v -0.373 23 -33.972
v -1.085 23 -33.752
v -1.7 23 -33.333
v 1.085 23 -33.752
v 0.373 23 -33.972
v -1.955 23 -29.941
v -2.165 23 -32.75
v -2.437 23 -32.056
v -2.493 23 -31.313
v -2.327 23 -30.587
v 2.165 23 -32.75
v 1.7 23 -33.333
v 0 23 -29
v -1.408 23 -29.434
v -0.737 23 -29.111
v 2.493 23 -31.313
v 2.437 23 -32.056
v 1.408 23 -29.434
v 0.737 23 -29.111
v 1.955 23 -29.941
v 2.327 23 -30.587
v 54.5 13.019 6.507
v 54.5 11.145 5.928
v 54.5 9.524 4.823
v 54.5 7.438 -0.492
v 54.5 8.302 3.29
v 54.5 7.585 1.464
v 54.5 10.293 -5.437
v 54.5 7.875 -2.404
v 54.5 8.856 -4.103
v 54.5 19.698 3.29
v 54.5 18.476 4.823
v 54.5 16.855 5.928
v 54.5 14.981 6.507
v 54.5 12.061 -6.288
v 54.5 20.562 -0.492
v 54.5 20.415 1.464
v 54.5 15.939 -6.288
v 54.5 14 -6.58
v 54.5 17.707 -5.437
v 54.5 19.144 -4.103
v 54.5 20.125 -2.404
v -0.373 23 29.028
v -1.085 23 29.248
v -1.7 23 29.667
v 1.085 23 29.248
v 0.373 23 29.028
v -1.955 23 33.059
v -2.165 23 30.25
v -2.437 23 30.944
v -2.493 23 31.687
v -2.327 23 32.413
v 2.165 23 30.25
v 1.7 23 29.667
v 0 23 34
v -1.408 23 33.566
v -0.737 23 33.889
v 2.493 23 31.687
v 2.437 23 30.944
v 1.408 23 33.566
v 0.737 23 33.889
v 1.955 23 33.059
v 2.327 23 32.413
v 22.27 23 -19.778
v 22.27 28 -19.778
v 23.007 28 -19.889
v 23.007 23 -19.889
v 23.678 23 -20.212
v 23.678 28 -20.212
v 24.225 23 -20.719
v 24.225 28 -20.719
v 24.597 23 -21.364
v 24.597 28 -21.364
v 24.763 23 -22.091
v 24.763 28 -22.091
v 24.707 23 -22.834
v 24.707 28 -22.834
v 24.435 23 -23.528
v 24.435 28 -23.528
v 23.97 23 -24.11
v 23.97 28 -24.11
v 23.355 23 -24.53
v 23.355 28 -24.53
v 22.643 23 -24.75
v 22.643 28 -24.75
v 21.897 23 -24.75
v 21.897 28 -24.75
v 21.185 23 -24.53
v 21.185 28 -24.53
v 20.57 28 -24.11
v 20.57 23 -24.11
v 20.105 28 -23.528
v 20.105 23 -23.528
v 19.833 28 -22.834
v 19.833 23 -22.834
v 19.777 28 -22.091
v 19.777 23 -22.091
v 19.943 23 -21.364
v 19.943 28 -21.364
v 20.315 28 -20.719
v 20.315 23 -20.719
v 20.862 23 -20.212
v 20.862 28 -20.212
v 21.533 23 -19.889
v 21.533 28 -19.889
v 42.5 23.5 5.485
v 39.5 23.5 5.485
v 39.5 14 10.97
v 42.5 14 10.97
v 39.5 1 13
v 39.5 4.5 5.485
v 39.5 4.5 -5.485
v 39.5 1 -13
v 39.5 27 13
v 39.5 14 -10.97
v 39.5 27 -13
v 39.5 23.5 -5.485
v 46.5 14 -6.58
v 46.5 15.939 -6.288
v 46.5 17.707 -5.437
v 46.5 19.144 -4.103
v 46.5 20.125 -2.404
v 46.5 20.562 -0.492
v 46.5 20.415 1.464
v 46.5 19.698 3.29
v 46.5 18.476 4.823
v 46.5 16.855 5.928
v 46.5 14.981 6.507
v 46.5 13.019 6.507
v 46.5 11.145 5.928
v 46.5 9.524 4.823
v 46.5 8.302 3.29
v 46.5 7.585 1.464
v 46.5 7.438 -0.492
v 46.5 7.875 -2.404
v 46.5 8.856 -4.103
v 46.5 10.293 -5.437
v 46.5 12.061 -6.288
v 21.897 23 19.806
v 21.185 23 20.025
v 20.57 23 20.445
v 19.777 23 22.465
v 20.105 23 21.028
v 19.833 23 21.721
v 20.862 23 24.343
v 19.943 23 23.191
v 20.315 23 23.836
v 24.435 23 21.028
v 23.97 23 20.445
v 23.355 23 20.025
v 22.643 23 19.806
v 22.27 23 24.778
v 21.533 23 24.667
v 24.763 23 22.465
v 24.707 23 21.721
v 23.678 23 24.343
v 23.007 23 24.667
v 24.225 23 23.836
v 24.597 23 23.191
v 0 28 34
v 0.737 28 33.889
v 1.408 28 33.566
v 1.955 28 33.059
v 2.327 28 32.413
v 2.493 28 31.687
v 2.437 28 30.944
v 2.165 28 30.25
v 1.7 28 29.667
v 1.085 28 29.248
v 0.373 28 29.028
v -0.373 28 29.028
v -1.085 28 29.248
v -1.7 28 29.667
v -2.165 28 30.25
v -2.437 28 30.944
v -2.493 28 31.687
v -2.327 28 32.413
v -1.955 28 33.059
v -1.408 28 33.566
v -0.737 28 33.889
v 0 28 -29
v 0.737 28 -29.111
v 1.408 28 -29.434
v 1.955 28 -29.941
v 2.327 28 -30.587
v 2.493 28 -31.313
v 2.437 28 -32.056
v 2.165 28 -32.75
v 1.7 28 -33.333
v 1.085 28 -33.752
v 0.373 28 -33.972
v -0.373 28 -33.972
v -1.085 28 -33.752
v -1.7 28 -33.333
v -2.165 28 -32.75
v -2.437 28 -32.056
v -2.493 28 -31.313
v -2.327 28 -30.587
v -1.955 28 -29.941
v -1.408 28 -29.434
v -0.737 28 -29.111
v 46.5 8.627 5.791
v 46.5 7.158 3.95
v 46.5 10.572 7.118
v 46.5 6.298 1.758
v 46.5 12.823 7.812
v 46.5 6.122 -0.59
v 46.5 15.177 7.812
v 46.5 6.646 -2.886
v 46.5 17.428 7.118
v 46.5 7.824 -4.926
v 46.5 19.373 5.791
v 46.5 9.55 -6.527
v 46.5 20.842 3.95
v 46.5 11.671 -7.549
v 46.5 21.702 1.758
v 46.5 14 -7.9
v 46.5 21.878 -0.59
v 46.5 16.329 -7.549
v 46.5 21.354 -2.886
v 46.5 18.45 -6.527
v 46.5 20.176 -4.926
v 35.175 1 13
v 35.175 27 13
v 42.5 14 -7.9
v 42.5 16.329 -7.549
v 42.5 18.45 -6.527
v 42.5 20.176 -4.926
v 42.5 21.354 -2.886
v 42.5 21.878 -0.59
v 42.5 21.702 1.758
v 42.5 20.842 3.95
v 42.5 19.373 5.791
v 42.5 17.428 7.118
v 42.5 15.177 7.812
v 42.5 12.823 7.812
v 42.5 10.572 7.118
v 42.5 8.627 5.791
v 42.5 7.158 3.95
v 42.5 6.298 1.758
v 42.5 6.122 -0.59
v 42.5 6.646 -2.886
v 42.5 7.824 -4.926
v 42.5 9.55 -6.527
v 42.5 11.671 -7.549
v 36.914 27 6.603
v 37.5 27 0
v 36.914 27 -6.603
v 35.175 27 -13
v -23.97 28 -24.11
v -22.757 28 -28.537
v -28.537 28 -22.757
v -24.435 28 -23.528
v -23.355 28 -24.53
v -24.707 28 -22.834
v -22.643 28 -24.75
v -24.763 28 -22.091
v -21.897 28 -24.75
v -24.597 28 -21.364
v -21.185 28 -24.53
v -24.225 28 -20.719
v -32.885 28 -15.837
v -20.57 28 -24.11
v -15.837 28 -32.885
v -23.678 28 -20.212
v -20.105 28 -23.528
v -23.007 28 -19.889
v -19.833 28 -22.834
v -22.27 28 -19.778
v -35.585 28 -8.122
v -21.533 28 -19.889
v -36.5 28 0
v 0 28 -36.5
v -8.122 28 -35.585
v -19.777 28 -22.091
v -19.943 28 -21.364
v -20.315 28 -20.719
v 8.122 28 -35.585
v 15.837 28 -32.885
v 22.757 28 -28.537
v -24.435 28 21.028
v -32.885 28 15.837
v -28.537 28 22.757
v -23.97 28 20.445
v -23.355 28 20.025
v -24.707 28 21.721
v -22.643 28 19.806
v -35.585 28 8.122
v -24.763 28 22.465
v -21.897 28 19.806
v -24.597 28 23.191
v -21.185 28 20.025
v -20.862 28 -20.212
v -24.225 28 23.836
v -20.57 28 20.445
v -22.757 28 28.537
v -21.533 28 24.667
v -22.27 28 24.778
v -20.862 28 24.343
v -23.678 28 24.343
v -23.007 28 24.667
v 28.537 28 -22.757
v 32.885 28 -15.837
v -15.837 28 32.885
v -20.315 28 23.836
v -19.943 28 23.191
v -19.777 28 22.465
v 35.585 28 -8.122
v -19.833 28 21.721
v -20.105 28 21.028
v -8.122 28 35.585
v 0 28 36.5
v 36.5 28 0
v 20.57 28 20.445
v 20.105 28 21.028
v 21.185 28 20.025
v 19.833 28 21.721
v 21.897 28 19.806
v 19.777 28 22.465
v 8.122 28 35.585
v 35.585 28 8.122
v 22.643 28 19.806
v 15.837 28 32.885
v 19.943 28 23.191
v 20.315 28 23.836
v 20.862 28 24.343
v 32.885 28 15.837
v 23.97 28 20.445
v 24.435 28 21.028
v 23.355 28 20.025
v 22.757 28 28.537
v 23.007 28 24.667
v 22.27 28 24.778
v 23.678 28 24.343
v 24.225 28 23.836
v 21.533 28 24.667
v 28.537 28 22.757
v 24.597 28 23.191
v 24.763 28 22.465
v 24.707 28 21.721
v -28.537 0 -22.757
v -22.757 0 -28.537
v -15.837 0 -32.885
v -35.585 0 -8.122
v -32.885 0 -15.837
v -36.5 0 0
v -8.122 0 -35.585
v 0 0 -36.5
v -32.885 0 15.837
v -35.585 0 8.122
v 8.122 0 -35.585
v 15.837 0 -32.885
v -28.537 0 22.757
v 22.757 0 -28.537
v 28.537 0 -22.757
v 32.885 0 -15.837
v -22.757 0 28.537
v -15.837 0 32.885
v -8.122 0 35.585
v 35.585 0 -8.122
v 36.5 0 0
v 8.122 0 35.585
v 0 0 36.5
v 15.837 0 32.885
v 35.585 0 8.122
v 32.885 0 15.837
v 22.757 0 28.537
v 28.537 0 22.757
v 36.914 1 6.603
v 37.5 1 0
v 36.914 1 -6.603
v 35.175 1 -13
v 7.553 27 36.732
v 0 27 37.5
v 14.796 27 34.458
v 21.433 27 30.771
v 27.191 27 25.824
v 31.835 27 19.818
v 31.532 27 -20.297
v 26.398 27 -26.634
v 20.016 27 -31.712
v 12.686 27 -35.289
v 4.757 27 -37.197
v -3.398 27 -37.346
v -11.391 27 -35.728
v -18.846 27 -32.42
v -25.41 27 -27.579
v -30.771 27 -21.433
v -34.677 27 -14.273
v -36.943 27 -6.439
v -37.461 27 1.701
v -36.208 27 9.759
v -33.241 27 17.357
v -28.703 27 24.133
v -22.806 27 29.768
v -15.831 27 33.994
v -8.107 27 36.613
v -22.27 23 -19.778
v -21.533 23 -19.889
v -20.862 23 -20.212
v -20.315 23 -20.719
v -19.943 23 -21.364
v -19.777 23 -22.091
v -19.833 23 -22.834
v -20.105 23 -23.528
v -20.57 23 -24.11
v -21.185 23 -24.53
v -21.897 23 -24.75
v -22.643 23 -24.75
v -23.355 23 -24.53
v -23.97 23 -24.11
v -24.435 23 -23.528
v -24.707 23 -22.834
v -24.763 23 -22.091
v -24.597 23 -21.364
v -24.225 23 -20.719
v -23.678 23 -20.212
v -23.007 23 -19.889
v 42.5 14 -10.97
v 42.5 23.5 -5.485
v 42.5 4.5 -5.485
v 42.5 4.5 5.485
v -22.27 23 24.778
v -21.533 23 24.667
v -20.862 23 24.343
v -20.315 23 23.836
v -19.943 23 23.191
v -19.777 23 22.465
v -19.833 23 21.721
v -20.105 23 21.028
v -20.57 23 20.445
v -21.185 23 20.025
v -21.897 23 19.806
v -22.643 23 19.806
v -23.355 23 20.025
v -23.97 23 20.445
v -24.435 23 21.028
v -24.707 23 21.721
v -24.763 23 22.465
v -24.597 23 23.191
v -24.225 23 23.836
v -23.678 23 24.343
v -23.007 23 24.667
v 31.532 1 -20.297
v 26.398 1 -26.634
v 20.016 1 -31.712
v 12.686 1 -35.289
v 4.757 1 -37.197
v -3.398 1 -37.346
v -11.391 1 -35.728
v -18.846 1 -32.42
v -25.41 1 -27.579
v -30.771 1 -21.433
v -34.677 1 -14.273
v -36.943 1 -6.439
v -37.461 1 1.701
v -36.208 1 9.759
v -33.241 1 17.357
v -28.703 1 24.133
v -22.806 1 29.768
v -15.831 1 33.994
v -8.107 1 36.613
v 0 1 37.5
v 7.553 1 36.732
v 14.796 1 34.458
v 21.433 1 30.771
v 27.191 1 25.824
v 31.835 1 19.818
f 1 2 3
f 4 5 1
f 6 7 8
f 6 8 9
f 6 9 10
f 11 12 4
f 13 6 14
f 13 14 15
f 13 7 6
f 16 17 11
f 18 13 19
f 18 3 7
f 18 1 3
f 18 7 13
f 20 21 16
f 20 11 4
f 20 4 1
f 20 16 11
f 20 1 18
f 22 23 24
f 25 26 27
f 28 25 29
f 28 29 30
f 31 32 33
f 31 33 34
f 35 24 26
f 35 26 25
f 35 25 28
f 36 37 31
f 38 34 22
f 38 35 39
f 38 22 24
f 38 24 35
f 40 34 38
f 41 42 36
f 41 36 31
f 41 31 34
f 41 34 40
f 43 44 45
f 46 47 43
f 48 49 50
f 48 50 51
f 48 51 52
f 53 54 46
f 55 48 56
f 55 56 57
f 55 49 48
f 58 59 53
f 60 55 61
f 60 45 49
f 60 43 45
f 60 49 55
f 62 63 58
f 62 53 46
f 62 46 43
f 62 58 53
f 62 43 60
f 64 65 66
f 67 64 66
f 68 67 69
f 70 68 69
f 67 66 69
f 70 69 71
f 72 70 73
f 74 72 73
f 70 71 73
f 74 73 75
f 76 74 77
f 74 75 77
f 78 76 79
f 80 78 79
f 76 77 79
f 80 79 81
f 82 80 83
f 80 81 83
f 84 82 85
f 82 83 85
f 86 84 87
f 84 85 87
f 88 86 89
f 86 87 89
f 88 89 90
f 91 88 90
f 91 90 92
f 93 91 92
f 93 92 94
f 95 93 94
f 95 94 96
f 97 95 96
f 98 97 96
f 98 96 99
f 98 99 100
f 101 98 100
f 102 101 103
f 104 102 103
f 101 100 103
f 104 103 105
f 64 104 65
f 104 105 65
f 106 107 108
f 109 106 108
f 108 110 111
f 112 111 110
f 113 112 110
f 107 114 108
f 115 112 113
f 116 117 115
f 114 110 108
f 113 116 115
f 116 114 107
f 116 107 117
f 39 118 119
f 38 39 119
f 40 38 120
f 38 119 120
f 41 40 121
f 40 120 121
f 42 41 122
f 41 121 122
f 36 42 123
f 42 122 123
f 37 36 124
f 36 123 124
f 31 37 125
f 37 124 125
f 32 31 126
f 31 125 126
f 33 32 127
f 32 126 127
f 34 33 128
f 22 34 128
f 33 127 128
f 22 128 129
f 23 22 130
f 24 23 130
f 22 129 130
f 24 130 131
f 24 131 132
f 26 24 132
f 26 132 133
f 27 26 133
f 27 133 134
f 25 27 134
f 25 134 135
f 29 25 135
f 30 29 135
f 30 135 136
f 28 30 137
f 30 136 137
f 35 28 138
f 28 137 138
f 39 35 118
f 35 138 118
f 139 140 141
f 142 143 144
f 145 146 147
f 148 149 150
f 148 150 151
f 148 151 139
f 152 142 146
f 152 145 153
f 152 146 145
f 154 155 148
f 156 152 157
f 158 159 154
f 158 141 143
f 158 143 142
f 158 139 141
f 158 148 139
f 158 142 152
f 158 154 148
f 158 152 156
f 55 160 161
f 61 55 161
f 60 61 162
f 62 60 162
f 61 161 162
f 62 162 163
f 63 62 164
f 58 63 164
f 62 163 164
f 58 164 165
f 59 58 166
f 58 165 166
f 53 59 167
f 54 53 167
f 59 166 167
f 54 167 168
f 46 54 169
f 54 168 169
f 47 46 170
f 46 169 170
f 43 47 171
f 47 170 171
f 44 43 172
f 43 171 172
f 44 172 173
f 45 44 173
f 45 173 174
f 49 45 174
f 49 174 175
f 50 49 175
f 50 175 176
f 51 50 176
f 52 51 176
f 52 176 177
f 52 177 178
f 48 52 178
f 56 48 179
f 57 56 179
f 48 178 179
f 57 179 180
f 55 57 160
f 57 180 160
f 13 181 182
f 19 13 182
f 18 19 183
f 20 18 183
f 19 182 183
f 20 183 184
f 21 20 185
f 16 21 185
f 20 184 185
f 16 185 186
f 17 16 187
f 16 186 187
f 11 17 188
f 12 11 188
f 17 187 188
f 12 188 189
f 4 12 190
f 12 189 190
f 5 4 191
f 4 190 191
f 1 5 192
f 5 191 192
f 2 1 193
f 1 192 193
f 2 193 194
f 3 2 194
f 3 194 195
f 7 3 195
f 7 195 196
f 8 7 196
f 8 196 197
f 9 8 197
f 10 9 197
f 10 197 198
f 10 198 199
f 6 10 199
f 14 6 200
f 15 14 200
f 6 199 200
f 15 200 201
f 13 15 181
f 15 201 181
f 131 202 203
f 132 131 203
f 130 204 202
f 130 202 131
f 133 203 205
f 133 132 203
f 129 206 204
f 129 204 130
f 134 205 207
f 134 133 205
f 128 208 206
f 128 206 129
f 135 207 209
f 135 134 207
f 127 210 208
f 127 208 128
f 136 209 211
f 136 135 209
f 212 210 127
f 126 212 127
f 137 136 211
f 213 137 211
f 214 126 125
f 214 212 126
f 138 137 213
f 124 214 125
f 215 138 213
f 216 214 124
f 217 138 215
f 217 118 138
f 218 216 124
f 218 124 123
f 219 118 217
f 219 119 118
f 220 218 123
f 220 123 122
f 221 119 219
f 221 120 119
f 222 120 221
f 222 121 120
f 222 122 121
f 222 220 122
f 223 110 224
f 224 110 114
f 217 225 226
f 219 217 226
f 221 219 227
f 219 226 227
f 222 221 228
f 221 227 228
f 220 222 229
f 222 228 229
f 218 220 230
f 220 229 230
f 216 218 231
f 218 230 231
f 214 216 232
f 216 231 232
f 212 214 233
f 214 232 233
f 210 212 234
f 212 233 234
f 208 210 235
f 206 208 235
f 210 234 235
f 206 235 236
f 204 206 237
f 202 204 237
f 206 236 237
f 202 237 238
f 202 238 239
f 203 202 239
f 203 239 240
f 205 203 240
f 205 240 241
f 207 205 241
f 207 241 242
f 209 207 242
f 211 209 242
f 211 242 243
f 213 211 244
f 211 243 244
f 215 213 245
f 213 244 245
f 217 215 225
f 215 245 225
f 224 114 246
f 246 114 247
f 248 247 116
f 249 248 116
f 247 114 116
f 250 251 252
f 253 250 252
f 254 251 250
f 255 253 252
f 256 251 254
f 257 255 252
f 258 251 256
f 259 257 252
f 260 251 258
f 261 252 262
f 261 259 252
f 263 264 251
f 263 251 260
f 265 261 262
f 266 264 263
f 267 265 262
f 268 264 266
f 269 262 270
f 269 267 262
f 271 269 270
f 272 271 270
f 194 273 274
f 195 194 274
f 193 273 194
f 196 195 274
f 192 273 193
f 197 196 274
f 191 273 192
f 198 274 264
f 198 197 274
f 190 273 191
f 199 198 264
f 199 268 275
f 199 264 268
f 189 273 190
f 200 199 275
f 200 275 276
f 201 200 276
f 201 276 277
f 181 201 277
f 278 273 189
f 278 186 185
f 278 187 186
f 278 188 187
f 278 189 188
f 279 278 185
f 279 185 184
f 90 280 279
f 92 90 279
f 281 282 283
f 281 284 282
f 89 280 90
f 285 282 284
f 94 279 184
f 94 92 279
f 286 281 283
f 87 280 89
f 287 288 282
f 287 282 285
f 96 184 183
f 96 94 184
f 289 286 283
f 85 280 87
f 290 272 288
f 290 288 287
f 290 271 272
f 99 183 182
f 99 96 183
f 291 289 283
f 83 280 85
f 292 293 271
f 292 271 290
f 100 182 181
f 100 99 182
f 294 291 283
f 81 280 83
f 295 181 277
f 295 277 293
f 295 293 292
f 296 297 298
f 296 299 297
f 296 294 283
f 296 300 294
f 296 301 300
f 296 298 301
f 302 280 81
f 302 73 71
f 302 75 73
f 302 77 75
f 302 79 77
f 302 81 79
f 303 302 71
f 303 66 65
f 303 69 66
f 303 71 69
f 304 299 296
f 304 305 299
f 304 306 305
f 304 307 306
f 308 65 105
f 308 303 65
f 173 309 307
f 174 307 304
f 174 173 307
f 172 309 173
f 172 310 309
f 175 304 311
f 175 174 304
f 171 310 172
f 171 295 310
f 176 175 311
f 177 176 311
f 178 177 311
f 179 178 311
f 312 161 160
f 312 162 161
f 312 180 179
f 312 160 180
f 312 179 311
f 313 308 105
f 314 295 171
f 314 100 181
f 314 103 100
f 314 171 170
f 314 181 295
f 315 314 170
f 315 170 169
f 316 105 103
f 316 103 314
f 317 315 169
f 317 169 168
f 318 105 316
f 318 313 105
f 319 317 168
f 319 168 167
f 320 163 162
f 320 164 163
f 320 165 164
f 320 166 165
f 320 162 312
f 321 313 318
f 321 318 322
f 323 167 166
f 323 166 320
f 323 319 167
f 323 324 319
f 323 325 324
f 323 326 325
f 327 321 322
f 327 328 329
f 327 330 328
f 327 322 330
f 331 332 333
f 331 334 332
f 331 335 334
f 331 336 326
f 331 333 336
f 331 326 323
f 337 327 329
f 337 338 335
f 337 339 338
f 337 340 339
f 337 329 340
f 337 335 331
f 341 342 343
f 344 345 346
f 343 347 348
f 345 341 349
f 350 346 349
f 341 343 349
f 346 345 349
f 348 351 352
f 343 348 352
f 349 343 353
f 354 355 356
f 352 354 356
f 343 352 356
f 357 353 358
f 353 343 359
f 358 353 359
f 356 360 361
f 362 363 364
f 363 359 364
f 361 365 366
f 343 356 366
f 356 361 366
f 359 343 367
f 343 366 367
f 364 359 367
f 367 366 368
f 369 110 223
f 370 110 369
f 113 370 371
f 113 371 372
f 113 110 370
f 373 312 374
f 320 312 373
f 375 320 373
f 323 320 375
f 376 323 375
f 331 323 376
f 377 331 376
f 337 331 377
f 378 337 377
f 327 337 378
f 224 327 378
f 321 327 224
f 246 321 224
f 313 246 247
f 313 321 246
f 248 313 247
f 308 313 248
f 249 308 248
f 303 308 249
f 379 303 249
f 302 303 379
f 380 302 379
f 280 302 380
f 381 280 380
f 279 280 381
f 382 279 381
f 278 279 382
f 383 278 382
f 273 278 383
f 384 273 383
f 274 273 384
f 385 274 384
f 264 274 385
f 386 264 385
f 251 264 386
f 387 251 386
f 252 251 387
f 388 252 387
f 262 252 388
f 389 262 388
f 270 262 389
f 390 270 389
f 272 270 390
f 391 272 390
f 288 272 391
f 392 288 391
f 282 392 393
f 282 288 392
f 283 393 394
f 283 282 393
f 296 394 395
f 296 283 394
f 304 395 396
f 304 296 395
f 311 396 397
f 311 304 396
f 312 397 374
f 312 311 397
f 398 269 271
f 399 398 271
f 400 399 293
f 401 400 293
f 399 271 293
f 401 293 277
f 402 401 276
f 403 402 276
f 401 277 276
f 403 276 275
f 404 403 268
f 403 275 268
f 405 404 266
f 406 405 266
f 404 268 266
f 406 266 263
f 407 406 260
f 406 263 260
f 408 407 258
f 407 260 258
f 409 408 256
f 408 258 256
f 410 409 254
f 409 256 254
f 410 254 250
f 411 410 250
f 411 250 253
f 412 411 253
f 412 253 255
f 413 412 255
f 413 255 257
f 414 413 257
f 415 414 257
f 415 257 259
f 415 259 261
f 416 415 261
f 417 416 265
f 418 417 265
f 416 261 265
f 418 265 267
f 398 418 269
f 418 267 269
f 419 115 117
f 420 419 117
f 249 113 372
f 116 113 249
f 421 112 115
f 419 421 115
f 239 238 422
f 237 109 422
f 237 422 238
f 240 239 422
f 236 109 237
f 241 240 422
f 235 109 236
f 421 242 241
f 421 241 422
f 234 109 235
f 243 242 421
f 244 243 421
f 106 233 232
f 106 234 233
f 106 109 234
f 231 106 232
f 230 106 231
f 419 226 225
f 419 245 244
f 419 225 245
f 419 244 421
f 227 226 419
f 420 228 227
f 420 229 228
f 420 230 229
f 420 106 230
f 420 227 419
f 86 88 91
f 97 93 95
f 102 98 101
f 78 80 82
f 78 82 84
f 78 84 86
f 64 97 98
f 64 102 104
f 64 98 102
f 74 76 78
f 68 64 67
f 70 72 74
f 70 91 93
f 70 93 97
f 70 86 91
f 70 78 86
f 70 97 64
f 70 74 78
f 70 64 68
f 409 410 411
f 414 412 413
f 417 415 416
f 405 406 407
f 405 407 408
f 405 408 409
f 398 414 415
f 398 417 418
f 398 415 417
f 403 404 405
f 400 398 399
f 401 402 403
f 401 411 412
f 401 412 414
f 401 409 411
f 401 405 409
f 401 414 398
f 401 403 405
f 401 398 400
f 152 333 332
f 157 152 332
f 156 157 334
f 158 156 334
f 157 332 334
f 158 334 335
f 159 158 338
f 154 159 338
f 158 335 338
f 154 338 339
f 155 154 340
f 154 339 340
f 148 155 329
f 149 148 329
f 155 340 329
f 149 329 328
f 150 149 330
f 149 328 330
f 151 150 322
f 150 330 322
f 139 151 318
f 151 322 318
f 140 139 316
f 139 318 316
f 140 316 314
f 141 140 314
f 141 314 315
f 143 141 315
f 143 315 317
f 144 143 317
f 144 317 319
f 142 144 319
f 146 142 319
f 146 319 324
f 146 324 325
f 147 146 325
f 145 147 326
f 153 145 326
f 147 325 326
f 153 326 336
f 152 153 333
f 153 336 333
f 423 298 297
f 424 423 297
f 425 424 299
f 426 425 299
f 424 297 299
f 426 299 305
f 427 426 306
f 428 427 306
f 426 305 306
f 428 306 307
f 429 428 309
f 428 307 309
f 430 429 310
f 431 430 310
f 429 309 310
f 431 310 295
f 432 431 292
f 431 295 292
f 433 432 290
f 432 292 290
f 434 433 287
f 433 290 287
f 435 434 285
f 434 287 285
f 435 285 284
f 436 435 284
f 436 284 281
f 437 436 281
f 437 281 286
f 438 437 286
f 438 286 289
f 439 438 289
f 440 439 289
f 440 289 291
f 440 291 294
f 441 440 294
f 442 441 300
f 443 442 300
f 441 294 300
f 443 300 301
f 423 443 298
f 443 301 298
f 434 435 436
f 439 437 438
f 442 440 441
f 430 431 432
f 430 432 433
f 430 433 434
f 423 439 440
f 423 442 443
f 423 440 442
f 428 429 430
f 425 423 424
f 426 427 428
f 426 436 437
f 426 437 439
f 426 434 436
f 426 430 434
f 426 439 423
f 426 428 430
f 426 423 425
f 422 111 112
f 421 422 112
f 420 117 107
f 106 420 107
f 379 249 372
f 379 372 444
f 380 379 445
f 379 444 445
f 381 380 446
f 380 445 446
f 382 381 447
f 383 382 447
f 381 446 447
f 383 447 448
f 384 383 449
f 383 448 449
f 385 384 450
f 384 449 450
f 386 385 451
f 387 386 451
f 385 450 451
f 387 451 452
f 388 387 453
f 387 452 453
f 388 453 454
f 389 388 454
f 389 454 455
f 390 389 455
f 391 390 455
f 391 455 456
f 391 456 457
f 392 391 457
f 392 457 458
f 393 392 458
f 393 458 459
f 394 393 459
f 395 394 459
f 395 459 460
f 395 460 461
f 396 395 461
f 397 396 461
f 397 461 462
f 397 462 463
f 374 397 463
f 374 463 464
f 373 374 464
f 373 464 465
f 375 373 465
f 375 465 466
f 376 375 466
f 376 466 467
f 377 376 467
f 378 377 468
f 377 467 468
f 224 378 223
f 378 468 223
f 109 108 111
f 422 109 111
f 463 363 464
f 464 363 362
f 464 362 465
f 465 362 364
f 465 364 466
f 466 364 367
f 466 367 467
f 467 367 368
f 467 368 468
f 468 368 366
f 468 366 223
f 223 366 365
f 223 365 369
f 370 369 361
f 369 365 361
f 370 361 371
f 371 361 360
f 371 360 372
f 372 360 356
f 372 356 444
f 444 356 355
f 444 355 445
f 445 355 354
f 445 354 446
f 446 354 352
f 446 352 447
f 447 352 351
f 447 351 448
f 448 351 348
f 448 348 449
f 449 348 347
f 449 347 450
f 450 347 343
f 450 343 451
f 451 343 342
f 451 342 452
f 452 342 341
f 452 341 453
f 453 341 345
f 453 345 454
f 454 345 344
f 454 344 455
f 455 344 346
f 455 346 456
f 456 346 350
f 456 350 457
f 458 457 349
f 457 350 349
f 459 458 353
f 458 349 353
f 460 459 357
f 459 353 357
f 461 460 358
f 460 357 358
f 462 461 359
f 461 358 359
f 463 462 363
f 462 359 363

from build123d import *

# Parameters (mm, degrees)
SKETCH1_R           = 37.5
BOSS_EXTRUDE1_DEPTH = 28
CHAMFER1_SIZE       = 1
BOSS_EXTRUDE2_REACH = 92.107
SKETCH2_W           = 26
SKETCH2_H           = 26
BOSS_EXTRUDE3_DEPTH = 3
SKETCH4_R           = 7.9
BOSS_EXTRUDE4_DEPTH = 4
SKETCH5_R           = 6.58
BOSS_EXTRUDE5_DEPTH = 8
SKETCH6_R           = 2.5
CUT_EXTRUDE1_DEPTH  = 5


with BuildPart() as part:
    # Sketch1 → Boss-Extrude1 (new body)
    with BuildSketch(Plane(origin=(0, 0, 0), x_dir=(1, 0, 0), z_dir=(0, 1, 0))):
        with Locations(Location((0, 0, 0), (0, 0, 270))):
            Circle(SKETCH1_R)
    extrude(amount=BOSS_EXTRUDE1_DEPTH)

    # Chamfer1
    chamfer1_edges = [part.edges().sort_by_distance(p)[0] for p in [
        (0, 0, -37.5),
        (0, 28, -37.5),
    ]]
    chamfer(chamfer1_edges, length=CHAMFER1_SIZE)

    # Sketch2 → Boss-Extrude2 (add, up to next)
    with BuildSketch(Plane(origin=(39.5, 0, 0), x_dir=(0, 0, -1), z_dir=(1, 0, 0)), mode=Mode.PRIVATE) as boss_extrude2_sk1:
        with Locations((0, 14)):
            Rectangle(SKETCH2_W, SKETCH2_H)
    boss_extrude2_tool1 = extrude(boss_extrude2_sk1.sketch, amount=-BOSS_EXTRUDE2_REACH, mode=Mode.PRIVATE) - part.part
    add(boss_extrude2_tool1.solids().sort_by_distance((39.5, 14, 0))[0])

    # Sketch3 → Boss-Extrude3 (add)
    with BuildSketch(Plane(origin=(39.5, 0, 0), x_dir=(0, 0, -1), z_dir=(1, 0, 0))):
        Polygon((10.97, 14), (5.485, 23.50029868), (-5.485, 23.50029868), (-10.97, 14), (-5.485, 4.49970132), (5.485, 4.49970132), align=None)
    extrude(amount=BOSS_EXTRUDE3_DEPTH)

    # Sketch4 → Boss-Extrude4 (add)
    with BuildSketch(Plane(origin=(42.5, 0, 0), x_dir=(0, 0, -1), z_dir=(1, 0, 0))):
        with Locations((0, 14)):
            Circle(SKETCH4_R)
    extrude(amount=BOSS_EXTRUDE4_DEPTH)

    # Sketch5 → Boss-Extrude5 (add)
    with BuildSketch(Plane(origin=(46.5, 0, 0), x_dir=(0, 0, -1), z_dir=(1, 0, 0))):
        with Locations((0, 14)):
            Circle(SKETCH5_R)
    extrude(amount=BOSS_EXTRUDE5_DEPTH)

    # Sketch6 → Cut-Extrude1 (cut)
    with BuildSketch(Plane(origin=(0, 28, 0), x_dir=(1, 0, 0), z_dir=(0, 1, 0))):
        with Locations(Location((0, 31.5, 0), (0, 0, 270))):
            Circle(SKETCH6_R)
        with Locations(Location((0, -31.5, 0), (0, 0, 270))):
            Circle(SKETCH6_R)
        with Locations(Location((22.27, -22.277726545, 0), (0, 0, 270))):
            Circle(SKETCH6_R)
        with Locations(Location((-22.27, -22.277726545, 0), (0, 0, 270))):
            Circle(SKETCH6_R)
        with Locations(Location((-22.27, 22.277726545, 0), (0, 0, 270))):
            Circle(SKETCH6_R)
        with Locations(Location((22.27, 22.277726545, 0), (0, 0, 270))):
            Circle(SKETCH6_R)
    extrude(amount=-CUT_EXTRUDE1_DEPTH, mode=Mode.SUBTRACT)


solid = part.part
